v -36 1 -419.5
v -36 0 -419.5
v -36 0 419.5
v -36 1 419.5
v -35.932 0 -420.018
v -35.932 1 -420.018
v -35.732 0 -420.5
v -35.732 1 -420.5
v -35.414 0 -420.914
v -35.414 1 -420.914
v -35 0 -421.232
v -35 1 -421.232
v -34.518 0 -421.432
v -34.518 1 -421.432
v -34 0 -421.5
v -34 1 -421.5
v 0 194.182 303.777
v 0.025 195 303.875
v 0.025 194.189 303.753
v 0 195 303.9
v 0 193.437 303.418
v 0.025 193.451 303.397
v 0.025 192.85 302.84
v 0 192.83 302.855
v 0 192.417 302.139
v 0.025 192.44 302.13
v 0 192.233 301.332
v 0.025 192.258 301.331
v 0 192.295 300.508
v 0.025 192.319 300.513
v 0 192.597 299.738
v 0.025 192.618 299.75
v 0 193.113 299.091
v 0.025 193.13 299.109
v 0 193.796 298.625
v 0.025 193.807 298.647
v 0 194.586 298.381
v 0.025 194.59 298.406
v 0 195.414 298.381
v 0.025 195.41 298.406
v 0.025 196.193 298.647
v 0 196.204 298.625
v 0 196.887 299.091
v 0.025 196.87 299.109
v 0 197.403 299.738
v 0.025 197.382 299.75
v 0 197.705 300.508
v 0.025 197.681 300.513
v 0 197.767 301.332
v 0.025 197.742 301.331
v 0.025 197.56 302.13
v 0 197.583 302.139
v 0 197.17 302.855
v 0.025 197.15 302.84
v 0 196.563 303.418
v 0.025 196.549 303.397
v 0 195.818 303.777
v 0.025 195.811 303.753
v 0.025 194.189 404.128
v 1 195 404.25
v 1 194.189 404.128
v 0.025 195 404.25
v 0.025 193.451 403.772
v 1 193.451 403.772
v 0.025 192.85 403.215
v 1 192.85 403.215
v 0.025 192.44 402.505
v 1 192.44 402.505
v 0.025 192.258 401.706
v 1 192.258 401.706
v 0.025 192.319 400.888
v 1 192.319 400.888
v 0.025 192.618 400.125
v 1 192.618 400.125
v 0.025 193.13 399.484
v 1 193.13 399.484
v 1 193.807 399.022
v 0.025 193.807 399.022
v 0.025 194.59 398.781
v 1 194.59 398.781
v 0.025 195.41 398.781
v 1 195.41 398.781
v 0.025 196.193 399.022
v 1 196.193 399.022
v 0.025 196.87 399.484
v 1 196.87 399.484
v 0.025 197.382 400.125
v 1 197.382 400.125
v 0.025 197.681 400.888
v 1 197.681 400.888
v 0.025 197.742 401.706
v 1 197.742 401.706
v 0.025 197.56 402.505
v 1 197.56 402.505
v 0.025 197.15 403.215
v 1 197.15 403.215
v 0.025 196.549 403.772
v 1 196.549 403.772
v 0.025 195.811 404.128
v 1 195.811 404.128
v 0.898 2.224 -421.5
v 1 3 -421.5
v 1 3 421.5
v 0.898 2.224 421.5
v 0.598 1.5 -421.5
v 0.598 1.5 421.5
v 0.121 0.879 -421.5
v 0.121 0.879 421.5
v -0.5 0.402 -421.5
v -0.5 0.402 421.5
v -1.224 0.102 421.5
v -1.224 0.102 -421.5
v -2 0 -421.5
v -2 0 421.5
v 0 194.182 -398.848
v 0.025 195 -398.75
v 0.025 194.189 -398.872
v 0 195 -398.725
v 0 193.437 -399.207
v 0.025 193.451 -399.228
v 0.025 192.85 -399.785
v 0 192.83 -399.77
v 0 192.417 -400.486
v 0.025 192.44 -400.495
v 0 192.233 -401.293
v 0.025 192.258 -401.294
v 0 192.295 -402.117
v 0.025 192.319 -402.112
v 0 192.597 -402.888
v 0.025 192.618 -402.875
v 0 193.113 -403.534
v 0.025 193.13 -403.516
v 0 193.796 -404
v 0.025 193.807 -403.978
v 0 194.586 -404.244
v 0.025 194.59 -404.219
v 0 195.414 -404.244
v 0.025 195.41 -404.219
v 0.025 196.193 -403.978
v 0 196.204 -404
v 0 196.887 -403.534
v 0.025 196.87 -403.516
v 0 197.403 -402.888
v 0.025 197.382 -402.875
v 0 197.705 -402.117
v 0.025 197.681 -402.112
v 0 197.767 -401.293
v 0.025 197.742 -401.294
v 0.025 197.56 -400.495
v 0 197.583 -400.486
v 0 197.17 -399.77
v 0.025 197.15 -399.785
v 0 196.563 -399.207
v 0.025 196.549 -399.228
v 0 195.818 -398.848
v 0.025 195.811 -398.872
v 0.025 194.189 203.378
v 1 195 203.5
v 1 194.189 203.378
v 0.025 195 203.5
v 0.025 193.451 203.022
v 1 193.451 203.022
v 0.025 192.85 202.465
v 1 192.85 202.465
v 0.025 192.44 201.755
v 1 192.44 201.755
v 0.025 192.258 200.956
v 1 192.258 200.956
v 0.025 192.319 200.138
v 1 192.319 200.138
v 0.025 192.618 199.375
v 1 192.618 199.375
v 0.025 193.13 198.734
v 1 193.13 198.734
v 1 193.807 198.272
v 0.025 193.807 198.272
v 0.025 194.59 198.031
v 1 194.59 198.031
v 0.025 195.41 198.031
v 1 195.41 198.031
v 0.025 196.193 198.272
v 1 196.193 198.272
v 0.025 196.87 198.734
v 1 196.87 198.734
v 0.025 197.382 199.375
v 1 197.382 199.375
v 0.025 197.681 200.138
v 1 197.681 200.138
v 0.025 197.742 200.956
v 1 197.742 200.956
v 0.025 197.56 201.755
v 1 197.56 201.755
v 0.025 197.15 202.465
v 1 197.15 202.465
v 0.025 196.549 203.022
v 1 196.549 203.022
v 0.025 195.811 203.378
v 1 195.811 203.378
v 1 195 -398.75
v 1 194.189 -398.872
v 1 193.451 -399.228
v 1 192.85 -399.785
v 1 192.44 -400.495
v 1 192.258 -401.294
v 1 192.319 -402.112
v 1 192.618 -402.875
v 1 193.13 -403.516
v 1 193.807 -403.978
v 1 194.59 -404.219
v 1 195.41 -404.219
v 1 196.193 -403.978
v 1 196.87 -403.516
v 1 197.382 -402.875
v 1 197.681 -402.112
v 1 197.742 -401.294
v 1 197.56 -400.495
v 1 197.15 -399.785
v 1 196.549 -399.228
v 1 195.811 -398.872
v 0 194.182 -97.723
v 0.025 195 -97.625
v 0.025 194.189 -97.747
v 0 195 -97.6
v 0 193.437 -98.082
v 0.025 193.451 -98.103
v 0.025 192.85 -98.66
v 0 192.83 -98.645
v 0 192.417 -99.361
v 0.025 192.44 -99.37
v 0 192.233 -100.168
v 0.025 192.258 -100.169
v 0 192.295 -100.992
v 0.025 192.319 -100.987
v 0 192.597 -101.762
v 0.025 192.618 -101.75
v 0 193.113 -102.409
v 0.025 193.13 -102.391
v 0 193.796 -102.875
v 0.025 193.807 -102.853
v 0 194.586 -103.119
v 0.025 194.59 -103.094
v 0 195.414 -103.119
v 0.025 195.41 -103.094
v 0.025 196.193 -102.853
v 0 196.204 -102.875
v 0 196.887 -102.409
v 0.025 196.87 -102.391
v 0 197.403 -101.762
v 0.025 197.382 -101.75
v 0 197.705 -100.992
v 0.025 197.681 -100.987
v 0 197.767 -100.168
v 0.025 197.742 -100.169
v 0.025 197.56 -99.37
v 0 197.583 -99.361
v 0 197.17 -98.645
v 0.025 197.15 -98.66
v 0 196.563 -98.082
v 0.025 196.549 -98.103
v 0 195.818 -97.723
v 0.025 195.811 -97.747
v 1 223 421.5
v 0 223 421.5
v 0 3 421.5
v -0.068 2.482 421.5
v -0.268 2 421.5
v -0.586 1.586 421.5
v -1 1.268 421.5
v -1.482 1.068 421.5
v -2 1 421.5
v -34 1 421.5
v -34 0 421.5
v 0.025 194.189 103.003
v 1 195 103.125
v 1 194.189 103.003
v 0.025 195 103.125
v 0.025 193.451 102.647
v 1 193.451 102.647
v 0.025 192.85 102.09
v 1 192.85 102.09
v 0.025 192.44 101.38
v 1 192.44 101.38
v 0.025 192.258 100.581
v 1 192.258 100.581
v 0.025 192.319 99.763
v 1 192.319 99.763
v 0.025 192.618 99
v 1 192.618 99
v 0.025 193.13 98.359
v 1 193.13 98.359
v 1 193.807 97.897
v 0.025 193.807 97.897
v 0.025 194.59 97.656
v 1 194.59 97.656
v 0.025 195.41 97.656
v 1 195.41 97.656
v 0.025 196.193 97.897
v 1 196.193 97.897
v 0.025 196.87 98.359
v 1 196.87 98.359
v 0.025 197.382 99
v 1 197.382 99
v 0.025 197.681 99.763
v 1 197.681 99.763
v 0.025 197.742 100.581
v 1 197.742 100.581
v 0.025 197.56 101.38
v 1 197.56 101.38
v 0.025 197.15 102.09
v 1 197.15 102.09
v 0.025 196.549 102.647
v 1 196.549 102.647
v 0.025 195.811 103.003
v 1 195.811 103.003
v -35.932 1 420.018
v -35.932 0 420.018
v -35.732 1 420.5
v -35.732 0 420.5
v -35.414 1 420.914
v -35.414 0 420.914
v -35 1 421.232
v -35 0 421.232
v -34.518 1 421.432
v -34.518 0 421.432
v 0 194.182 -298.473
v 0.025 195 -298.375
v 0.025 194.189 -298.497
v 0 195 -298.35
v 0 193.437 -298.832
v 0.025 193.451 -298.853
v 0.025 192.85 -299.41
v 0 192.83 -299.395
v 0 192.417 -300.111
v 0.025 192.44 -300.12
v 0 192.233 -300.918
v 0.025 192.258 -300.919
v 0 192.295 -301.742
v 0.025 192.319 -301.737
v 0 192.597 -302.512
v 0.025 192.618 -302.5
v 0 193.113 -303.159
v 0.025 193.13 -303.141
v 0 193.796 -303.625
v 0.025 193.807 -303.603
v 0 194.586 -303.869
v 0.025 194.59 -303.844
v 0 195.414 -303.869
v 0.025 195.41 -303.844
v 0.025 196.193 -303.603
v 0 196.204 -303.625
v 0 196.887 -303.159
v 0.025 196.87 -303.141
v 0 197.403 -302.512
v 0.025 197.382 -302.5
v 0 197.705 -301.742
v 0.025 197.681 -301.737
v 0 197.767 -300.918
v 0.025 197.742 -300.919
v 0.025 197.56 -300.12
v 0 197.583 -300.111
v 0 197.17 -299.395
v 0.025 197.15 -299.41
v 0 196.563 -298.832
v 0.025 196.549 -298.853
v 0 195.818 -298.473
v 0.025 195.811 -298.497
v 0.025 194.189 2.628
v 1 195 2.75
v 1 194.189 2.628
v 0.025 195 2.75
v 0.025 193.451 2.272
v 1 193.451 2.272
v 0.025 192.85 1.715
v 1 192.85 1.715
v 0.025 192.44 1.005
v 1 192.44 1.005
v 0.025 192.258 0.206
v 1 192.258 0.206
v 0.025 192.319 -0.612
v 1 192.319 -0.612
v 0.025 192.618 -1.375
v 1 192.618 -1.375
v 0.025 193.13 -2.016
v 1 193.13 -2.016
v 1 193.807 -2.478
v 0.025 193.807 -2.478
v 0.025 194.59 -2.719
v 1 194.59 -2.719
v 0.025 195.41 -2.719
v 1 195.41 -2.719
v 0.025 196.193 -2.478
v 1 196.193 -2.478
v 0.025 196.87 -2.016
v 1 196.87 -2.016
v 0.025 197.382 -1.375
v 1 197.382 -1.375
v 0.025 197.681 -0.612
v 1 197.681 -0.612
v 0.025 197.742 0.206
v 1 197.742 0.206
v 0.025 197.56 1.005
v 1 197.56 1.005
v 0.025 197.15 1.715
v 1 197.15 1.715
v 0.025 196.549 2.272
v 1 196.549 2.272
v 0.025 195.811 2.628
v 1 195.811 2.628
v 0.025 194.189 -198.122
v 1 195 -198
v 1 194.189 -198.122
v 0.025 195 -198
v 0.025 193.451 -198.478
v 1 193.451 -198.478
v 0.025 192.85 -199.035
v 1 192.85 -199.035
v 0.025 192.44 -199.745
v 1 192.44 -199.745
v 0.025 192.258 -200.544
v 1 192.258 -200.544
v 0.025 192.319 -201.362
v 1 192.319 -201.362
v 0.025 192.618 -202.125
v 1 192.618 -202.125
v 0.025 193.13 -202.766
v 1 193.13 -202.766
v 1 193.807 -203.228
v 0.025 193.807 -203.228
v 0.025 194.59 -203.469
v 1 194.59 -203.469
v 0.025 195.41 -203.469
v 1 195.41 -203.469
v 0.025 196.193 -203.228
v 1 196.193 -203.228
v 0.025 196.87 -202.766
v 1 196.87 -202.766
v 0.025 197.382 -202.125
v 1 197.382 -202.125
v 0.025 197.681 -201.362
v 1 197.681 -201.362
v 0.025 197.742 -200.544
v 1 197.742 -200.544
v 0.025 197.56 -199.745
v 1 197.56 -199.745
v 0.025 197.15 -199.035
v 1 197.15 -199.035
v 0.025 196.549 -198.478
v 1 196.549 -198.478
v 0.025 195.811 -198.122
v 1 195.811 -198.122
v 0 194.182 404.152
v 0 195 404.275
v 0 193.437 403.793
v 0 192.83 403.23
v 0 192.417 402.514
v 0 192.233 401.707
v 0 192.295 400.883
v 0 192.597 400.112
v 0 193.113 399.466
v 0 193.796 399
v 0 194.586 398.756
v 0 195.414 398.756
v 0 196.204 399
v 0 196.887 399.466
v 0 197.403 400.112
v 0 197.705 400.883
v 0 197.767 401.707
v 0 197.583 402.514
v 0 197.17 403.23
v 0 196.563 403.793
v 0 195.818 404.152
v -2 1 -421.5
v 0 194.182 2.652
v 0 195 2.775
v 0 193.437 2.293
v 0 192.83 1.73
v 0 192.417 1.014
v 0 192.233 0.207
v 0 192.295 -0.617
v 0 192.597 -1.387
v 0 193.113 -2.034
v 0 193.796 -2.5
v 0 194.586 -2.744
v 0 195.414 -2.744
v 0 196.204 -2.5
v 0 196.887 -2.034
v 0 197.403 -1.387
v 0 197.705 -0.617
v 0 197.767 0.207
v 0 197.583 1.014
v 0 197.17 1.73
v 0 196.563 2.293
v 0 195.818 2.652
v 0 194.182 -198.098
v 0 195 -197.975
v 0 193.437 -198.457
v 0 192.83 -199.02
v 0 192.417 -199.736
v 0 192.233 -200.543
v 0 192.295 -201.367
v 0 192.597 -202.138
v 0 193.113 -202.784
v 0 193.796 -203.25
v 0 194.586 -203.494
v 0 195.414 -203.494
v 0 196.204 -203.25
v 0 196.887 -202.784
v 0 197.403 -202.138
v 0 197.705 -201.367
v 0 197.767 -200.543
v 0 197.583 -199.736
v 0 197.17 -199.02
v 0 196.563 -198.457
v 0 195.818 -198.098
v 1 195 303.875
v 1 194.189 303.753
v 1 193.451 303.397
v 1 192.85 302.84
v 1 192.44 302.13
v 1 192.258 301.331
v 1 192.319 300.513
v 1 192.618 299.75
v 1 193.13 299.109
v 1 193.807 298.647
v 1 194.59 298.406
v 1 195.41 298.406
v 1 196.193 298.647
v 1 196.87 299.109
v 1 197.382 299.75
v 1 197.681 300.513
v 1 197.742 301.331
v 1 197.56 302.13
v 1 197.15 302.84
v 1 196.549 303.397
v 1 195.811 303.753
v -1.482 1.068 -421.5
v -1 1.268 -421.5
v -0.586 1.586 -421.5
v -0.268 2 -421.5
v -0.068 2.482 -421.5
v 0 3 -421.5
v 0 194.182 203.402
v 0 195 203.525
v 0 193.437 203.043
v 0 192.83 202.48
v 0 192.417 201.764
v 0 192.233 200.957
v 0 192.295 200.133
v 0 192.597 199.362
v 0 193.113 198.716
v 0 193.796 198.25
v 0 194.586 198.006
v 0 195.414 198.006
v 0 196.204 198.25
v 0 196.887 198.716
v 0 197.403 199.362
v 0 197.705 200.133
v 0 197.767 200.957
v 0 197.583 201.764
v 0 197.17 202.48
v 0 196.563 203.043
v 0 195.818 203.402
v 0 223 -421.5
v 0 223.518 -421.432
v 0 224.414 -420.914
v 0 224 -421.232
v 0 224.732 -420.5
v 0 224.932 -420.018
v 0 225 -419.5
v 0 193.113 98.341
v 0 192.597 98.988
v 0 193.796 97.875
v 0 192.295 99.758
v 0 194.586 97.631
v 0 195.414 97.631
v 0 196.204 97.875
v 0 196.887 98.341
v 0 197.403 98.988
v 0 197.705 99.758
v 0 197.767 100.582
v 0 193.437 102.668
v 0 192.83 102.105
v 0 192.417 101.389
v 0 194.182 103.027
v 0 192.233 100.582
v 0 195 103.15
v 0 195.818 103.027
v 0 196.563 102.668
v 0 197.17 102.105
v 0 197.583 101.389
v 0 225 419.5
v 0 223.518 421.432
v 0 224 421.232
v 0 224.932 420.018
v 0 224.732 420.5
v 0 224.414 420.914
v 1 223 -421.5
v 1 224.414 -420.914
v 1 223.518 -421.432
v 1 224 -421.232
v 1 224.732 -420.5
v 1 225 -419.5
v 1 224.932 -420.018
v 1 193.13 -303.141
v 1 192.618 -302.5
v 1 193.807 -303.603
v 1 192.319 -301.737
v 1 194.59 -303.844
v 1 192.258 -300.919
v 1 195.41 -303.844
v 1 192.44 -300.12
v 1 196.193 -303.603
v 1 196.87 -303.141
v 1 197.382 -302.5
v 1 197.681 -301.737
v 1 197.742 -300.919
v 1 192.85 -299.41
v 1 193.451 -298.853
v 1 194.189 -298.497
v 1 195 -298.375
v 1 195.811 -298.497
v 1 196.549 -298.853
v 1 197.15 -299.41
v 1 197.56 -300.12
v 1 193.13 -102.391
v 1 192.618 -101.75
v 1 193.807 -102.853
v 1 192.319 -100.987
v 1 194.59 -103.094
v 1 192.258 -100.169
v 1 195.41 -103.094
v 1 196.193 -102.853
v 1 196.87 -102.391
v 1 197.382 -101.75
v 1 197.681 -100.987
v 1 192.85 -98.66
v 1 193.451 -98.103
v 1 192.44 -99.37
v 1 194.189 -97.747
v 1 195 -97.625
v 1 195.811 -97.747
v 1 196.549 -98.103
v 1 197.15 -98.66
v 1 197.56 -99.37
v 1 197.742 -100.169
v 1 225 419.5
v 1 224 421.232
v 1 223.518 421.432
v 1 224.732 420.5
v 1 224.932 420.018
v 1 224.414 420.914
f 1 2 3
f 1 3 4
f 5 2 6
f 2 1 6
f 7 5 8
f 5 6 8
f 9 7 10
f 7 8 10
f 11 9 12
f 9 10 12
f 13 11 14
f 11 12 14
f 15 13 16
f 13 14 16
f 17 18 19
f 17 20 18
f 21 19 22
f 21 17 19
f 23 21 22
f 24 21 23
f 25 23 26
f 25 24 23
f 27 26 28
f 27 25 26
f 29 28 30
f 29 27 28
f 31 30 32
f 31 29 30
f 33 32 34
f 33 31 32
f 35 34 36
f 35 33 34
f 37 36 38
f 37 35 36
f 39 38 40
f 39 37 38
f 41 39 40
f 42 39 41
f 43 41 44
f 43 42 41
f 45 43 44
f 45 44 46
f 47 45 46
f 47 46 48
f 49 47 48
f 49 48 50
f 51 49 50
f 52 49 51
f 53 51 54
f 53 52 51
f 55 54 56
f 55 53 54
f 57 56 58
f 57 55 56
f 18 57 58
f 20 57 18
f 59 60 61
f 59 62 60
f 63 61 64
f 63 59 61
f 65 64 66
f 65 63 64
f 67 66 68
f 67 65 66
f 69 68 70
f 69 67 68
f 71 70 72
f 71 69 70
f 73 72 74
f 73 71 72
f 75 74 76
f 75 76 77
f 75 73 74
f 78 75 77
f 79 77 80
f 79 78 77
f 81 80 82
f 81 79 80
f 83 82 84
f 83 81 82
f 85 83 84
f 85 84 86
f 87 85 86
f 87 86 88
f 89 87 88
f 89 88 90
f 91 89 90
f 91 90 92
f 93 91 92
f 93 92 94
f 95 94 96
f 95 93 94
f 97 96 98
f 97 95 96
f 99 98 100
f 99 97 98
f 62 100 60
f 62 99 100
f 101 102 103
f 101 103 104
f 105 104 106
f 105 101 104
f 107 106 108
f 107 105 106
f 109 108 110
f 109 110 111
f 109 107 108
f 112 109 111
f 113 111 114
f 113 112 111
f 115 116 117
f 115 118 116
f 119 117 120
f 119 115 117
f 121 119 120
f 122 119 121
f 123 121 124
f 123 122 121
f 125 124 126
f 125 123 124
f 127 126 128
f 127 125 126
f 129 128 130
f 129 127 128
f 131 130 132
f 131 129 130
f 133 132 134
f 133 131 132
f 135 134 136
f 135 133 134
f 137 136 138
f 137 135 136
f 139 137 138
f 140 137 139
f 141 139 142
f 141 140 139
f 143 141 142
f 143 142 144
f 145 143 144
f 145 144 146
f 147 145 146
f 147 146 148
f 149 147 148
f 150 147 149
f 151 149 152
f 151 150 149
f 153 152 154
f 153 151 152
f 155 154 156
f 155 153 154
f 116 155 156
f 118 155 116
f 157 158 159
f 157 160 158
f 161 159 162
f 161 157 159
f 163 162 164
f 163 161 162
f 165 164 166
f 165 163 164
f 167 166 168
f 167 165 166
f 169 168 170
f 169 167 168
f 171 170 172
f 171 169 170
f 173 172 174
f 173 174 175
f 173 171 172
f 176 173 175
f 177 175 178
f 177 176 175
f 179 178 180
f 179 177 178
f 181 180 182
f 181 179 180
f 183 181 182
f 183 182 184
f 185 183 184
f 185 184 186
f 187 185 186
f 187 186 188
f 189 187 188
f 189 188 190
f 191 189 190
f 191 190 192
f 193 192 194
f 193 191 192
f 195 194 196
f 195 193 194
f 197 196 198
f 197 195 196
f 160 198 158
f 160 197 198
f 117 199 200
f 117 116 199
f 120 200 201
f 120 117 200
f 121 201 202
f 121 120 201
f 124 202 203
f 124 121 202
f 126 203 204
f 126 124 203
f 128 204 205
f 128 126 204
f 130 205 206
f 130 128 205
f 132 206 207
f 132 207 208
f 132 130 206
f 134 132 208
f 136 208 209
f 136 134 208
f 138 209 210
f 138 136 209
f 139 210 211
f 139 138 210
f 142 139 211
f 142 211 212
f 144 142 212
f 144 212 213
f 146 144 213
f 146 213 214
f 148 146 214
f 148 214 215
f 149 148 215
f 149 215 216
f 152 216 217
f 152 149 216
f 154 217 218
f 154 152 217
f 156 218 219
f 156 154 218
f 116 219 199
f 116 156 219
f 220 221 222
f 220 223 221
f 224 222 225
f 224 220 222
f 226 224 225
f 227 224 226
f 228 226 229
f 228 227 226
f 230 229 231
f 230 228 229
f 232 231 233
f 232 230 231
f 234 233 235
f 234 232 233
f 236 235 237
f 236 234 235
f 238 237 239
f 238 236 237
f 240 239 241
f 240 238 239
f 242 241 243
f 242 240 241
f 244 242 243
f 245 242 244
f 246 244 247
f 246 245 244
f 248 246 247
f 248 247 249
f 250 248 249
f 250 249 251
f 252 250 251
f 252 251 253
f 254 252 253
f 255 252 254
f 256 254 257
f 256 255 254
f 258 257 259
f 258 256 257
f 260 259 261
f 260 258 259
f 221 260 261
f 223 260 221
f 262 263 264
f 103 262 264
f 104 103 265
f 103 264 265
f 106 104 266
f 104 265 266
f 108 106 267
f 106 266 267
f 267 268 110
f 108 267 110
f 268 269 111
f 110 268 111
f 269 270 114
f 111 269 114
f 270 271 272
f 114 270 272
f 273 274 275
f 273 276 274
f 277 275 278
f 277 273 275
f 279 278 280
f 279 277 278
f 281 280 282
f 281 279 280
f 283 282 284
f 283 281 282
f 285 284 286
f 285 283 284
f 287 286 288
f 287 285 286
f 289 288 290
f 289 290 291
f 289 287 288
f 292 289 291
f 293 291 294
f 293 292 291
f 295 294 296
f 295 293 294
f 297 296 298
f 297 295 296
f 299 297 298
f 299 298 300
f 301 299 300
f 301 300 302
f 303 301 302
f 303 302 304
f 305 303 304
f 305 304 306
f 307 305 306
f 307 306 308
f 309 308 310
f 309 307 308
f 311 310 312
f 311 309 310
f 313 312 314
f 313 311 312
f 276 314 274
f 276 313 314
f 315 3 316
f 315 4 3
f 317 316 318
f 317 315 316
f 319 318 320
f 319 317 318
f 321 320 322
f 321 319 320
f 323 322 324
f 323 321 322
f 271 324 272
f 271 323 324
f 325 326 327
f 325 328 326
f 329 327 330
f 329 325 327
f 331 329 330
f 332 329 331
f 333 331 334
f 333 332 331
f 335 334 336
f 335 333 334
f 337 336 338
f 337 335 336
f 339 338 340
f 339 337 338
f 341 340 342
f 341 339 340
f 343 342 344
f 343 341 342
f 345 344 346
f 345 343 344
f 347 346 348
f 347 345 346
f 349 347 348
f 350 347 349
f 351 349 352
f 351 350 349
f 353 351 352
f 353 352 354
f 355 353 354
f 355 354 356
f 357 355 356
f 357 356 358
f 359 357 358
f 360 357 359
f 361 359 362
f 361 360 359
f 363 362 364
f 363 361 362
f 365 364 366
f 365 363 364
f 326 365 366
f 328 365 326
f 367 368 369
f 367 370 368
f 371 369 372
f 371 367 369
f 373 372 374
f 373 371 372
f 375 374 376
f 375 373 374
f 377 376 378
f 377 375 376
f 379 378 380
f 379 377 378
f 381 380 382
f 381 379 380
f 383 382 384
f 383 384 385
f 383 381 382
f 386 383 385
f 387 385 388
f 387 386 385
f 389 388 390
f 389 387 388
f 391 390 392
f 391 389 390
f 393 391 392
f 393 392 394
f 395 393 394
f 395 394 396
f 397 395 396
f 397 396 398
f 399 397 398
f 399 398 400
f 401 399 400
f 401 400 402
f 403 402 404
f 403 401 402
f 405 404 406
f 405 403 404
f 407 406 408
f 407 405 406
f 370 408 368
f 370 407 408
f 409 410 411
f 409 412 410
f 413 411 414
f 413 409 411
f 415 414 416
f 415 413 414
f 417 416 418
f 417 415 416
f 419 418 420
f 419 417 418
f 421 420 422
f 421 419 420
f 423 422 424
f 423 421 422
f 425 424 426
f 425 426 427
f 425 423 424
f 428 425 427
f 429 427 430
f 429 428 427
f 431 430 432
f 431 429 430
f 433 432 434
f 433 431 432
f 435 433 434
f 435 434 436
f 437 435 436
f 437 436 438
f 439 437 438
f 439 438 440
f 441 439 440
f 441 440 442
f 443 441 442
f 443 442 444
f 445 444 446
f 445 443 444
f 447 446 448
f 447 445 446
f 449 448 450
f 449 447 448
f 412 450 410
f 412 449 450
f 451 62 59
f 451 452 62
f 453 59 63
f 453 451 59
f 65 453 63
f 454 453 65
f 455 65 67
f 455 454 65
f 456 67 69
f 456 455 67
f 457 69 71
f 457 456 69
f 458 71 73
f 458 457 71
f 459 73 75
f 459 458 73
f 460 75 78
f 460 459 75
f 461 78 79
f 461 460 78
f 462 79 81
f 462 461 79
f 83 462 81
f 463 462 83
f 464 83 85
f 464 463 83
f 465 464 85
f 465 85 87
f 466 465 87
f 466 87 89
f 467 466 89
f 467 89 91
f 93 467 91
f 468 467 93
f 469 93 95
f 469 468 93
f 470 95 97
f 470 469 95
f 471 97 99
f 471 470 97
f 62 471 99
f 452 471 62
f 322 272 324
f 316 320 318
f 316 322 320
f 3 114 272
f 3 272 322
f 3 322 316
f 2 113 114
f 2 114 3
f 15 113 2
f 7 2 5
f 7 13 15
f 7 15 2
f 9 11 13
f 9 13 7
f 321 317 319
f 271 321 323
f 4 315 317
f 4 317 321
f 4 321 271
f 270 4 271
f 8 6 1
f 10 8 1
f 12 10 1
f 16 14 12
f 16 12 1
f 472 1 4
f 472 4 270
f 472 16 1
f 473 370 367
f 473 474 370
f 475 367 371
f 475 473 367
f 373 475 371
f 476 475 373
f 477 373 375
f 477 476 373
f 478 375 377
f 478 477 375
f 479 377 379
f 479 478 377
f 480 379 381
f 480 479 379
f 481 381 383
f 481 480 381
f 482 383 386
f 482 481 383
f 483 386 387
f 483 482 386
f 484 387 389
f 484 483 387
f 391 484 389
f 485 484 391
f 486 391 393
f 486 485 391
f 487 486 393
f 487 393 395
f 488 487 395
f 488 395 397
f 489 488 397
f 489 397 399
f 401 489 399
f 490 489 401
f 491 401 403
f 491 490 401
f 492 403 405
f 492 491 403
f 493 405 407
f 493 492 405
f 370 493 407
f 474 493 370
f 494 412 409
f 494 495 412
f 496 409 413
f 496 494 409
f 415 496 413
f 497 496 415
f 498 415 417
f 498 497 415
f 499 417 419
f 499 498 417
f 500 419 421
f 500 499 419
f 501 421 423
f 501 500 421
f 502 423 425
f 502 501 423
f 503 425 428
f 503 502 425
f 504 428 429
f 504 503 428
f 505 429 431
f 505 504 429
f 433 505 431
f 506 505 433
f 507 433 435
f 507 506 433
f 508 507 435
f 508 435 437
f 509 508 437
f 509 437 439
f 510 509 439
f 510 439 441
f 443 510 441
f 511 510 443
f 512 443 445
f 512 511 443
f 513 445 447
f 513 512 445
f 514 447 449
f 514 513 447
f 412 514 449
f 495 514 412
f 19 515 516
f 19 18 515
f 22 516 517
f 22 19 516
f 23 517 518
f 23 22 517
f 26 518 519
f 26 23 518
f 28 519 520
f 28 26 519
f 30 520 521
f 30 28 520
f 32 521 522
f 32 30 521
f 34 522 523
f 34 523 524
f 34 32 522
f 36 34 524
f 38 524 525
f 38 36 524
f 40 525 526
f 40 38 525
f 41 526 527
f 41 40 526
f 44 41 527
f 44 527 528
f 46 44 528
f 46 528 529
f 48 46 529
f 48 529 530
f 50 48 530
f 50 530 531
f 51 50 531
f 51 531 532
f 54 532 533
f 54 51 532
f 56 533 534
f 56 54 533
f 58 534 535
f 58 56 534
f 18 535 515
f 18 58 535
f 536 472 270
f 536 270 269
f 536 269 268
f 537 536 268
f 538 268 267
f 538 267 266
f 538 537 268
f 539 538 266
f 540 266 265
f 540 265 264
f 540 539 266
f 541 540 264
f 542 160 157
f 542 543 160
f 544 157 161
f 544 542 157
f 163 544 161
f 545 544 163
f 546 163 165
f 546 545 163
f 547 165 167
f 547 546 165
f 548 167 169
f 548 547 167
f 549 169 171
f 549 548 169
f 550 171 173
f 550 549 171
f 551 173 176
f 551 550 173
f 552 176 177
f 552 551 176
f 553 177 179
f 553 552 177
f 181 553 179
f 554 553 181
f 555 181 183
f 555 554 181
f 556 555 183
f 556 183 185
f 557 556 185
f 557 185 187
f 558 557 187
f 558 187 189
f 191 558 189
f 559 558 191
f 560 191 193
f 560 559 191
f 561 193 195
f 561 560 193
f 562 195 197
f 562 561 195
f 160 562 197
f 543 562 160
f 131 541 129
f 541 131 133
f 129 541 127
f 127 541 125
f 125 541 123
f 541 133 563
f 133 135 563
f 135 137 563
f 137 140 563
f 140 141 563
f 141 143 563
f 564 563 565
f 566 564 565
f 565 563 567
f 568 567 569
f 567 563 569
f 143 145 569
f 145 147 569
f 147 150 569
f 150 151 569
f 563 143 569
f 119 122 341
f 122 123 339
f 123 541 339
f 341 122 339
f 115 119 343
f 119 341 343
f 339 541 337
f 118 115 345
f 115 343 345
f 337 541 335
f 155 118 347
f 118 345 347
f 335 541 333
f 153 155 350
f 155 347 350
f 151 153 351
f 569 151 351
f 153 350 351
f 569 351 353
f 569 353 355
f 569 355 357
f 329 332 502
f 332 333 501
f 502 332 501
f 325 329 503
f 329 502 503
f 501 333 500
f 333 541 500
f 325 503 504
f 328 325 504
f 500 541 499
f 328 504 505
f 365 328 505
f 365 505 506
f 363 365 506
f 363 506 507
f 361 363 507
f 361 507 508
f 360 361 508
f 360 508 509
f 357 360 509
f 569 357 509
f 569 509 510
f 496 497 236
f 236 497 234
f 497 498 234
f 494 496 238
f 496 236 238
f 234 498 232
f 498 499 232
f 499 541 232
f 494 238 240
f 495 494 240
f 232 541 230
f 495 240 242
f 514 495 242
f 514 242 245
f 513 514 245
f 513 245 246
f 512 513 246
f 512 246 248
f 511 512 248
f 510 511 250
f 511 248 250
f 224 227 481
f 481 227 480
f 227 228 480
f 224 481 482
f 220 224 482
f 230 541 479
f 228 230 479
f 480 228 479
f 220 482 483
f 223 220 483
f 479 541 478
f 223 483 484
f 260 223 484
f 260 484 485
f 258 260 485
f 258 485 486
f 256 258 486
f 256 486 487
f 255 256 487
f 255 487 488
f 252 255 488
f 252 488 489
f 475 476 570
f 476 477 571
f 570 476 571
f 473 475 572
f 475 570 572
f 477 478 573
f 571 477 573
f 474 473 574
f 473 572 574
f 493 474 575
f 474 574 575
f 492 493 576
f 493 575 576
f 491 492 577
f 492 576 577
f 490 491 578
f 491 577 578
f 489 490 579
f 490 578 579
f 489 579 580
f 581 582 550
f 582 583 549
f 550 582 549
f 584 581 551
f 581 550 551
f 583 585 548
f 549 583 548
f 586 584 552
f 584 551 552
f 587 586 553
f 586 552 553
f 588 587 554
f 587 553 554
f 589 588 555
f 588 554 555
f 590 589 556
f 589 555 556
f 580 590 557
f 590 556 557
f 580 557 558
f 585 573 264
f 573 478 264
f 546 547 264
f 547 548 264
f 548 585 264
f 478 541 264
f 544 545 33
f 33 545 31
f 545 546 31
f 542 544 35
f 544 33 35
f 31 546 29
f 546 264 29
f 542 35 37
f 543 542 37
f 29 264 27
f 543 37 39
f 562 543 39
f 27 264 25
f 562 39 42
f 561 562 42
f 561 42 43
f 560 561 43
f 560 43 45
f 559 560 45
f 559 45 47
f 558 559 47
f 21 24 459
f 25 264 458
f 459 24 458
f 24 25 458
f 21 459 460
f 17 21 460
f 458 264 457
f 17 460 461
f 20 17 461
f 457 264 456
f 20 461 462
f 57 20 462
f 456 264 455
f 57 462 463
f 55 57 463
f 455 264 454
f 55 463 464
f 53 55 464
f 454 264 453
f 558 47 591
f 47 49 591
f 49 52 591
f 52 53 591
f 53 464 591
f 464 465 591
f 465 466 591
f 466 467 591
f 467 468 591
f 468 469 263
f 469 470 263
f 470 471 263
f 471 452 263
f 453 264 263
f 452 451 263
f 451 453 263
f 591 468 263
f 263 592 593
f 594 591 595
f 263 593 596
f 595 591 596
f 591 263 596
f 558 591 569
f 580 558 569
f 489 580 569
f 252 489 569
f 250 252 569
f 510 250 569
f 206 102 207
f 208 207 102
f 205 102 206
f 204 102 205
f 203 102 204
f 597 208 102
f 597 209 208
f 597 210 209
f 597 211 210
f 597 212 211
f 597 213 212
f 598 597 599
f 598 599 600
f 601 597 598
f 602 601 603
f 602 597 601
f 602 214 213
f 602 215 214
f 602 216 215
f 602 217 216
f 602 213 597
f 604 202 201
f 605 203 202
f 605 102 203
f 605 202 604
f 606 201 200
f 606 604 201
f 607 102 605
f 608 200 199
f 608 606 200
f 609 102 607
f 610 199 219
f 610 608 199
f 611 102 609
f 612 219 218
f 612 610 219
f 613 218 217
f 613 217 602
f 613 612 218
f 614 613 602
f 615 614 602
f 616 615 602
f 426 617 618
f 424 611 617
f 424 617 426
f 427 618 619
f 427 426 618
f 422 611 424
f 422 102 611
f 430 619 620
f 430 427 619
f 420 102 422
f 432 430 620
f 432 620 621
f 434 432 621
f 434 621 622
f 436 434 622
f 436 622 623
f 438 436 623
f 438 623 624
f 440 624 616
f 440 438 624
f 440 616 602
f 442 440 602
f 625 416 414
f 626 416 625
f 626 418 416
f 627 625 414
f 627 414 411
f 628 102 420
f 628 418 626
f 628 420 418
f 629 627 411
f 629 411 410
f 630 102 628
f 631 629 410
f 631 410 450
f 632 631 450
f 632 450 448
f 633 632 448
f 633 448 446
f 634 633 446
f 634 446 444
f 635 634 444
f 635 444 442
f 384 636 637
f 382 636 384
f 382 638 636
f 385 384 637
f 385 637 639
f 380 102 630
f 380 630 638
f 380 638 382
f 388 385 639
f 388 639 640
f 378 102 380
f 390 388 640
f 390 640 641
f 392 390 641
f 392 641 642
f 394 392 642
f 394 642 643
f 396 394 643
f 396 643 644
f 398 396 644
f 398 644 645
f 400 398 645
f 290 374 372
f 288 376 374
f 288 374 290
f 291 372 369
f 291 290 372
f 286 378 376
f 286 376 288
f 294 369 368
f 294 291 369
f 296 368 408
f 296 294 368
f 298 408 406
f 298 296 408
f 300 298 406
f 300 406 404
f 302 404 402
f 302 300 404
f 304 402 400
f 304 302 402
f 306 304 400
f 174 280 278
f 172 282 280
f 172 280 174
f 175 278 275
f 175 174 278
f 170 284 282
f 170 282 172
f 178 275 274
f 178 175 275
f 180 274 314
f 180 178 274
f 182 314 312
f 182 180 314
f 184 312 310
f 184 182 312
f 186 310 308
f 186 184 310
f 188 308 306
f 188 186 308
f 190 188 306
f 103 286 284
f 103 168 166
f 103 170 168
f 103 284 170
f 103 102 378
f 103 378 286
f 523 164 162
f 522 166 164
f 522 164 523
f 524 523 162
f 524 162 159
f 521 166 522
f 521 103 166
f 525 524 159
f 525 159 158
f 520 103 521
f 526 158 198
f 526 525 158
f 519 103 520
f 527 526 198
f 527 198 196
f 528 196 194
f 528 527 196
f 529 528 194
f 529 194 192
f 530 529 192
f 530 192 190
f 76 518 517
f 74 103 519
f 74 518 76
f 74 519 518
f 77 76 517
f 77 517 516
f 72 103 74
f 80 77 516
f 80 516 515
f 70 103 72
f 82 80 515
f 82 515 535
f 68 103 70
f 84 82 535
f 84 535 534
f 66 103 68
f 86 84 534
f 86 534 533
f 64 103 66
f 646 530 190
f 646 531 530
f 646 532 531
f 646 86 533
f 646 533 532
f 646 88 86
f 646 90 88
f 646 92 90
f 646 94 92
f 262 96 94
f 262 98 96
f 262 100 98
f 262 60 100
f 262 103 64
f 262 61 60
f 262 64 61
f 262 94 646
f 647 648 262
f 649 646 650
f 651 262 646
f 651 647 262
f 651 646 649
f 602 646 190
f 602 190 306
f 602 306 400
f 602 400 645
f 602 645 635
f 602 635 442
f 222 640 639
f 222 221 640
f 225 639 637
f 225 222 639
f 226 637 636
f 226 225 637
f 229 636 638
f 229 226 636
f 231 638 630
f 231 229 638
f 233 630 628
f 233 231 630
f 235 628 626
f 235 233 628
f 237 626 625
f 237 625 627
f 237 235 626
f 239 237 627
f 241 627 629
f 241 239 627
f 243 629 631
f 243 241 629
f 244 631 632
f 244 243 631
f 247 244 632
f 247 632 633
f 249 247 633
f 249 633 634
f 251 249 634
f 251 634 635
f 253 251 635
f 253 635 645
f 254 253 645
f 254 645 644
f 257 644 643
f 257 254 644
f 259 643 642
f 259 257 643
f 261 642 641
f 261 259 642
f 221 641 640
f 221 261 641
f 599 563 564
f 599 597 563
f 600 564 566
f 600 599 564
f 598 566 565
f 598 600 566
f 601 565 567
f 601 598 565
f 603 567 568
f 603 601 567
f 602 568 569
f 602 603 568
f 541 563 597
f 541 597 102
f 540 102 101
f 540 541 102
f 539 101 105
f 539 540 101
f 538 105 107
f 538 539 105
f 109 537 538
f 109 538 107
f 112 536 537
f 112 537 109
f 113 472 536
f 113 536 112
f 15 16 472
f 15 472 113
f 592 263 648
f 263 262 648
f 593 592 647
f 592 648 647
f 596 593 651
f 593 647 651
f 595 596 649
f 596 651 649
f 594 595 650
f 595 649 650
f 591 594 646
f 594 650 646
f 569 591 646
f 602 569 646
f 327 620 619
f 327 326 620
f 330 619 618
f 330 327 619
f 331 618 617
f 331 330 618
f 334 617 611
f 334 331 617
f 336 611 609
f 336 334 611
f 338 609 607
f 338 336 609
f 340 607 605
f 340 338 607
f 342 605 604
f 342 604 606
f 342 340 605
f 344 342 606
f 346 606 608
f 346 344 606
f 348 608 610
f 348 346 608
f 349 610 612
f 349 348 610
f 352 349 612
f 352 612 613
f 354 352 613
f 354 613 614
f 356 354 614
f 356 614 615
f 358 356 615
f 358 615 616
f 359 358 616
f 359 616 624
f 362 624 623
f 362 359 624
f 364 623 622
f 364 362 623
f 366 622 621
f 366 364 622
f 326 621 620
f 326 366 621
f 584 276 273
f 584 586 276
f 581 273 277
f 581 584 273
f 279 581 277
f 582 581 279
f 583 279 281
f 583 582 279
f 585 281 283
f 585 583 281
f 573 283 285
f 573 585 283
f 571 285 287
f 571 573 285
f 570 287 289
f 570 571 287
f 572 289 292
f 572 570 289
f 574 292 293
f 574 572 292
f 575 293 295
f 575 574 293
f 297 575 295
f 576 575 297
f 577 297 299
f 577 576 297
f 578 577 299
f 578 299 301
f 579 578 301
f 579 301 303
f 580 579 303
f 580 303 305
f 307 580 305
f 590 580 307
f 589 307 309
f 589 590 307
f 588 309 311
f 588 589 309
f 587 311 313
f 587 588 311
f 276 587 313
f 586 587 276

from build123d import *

# Parameters (mm, degrees)
SKETCH2_W                    = 1
SKETCH2_H                    = 225
BASE_FLANGE1_DEPTH           = 421.5
EDGE_FLANGE1_STRIP_W         = 8
EDGE_FLANGE1_STRIP_H         = 1
EDGE_FLANGE1_STRIP_CUT_DEPTH = 843
EDGE_FLANGE1_DEPTH           = 843
CRVPATTERN1_COUNT            = 9
CRVPATTERN1_PITCH            = 100.375
FILLET1_R                    = 2


# Sheet-metal steps are written as plain solids
with BuildPart() as part:
    # Sketch2 → Base-Flange1 (new, symmetric)
    with BuildSketch(Plane.XY):
        with Locations((0.5, 112.5)):
            Rectangle(SKETCH2_W, SKETCH2_H)
    extrude(amount=BASE_FLANGE1_DEPTH, both=True)

    # Edge-Flange1 strip (across the edge) → Edge-Flange1 strip cut (cut)
    with BuildSketch(Plane(origin=(0, 0, -421.5), x_dir=(0, 1, 0), z_dir=(0, 0, 1))):
        with Locations((-1, -0.5)):
            Rectangle(EDGE_FLANGE1_STRIP_W, EDGE_FLANGE1_STRIP_H)
    extrude(amount=EDGE_FLANGE1_STRIP_CUT_DEPTH, mode=Mode.SUBTRACT)

    # Edge-Flange1 section (across the edge) → Edge-Flange1 (add)
    with BuildSketch(Plane(origin=(0, 0, -421.5), x_dir=(0, 1, 0), z_dir=(0, 0, 1))):
        with BuildLine():
            Line((0, 2), (0, 36))
            Line((0, 36), (1, 36))
            Line((1, 36), (1, 2))
            ThreePointArc((1, 2), (1.585786438, 0.585786438), (3, 0))
            Line((3, 0), (3, -1))
            ThreePointArc((3, -1), (0.878679656, -0.121320344), (0, 2))
        make_face()
    extrude(amount=EDGE_FLANGE1_DEPTH)

    # Sketch8 → M5 Clearance Hole1 (revolve, cut)
    with BuildSketch(Plane(origin=(0, 195, -401.5), x_dir=(0, 0, 1), z_dir=(0, 1, 0))):
        Polygon((0, 0), (0, 1), (2.75, 1), (2.75, 0.025), (2.775, 0), align=None)
    m5_clearance_hole1 = revolve(axis=Axis((-6.35, 195, -401.5), (1, 0, 0)), mode=Mode.SUBTRACT)

    # CrvPattern1: M5 Clearance Hole1 ×9
    with Locations(*[(0, 0, i * CRVPATTERN1_PITCH) for i in range(1, CRVPATTERN1_COUNT)]):
        add(m5_clearance_hole1, mode=Mode.SUBTRACT)

    # Fillet1
    fillet1_edges = [part.edges().sort_by_distance(p)[0] for p in [
        (-36, 0.5, -421.5),
        (-36, 0.5, 421.5),
        (0.5, 225, -421.5),
        (0.5, 225, 421.5),
    ]]
    fillet(fillet1_edges, radius=FILLET1_R)


solid = part.part
